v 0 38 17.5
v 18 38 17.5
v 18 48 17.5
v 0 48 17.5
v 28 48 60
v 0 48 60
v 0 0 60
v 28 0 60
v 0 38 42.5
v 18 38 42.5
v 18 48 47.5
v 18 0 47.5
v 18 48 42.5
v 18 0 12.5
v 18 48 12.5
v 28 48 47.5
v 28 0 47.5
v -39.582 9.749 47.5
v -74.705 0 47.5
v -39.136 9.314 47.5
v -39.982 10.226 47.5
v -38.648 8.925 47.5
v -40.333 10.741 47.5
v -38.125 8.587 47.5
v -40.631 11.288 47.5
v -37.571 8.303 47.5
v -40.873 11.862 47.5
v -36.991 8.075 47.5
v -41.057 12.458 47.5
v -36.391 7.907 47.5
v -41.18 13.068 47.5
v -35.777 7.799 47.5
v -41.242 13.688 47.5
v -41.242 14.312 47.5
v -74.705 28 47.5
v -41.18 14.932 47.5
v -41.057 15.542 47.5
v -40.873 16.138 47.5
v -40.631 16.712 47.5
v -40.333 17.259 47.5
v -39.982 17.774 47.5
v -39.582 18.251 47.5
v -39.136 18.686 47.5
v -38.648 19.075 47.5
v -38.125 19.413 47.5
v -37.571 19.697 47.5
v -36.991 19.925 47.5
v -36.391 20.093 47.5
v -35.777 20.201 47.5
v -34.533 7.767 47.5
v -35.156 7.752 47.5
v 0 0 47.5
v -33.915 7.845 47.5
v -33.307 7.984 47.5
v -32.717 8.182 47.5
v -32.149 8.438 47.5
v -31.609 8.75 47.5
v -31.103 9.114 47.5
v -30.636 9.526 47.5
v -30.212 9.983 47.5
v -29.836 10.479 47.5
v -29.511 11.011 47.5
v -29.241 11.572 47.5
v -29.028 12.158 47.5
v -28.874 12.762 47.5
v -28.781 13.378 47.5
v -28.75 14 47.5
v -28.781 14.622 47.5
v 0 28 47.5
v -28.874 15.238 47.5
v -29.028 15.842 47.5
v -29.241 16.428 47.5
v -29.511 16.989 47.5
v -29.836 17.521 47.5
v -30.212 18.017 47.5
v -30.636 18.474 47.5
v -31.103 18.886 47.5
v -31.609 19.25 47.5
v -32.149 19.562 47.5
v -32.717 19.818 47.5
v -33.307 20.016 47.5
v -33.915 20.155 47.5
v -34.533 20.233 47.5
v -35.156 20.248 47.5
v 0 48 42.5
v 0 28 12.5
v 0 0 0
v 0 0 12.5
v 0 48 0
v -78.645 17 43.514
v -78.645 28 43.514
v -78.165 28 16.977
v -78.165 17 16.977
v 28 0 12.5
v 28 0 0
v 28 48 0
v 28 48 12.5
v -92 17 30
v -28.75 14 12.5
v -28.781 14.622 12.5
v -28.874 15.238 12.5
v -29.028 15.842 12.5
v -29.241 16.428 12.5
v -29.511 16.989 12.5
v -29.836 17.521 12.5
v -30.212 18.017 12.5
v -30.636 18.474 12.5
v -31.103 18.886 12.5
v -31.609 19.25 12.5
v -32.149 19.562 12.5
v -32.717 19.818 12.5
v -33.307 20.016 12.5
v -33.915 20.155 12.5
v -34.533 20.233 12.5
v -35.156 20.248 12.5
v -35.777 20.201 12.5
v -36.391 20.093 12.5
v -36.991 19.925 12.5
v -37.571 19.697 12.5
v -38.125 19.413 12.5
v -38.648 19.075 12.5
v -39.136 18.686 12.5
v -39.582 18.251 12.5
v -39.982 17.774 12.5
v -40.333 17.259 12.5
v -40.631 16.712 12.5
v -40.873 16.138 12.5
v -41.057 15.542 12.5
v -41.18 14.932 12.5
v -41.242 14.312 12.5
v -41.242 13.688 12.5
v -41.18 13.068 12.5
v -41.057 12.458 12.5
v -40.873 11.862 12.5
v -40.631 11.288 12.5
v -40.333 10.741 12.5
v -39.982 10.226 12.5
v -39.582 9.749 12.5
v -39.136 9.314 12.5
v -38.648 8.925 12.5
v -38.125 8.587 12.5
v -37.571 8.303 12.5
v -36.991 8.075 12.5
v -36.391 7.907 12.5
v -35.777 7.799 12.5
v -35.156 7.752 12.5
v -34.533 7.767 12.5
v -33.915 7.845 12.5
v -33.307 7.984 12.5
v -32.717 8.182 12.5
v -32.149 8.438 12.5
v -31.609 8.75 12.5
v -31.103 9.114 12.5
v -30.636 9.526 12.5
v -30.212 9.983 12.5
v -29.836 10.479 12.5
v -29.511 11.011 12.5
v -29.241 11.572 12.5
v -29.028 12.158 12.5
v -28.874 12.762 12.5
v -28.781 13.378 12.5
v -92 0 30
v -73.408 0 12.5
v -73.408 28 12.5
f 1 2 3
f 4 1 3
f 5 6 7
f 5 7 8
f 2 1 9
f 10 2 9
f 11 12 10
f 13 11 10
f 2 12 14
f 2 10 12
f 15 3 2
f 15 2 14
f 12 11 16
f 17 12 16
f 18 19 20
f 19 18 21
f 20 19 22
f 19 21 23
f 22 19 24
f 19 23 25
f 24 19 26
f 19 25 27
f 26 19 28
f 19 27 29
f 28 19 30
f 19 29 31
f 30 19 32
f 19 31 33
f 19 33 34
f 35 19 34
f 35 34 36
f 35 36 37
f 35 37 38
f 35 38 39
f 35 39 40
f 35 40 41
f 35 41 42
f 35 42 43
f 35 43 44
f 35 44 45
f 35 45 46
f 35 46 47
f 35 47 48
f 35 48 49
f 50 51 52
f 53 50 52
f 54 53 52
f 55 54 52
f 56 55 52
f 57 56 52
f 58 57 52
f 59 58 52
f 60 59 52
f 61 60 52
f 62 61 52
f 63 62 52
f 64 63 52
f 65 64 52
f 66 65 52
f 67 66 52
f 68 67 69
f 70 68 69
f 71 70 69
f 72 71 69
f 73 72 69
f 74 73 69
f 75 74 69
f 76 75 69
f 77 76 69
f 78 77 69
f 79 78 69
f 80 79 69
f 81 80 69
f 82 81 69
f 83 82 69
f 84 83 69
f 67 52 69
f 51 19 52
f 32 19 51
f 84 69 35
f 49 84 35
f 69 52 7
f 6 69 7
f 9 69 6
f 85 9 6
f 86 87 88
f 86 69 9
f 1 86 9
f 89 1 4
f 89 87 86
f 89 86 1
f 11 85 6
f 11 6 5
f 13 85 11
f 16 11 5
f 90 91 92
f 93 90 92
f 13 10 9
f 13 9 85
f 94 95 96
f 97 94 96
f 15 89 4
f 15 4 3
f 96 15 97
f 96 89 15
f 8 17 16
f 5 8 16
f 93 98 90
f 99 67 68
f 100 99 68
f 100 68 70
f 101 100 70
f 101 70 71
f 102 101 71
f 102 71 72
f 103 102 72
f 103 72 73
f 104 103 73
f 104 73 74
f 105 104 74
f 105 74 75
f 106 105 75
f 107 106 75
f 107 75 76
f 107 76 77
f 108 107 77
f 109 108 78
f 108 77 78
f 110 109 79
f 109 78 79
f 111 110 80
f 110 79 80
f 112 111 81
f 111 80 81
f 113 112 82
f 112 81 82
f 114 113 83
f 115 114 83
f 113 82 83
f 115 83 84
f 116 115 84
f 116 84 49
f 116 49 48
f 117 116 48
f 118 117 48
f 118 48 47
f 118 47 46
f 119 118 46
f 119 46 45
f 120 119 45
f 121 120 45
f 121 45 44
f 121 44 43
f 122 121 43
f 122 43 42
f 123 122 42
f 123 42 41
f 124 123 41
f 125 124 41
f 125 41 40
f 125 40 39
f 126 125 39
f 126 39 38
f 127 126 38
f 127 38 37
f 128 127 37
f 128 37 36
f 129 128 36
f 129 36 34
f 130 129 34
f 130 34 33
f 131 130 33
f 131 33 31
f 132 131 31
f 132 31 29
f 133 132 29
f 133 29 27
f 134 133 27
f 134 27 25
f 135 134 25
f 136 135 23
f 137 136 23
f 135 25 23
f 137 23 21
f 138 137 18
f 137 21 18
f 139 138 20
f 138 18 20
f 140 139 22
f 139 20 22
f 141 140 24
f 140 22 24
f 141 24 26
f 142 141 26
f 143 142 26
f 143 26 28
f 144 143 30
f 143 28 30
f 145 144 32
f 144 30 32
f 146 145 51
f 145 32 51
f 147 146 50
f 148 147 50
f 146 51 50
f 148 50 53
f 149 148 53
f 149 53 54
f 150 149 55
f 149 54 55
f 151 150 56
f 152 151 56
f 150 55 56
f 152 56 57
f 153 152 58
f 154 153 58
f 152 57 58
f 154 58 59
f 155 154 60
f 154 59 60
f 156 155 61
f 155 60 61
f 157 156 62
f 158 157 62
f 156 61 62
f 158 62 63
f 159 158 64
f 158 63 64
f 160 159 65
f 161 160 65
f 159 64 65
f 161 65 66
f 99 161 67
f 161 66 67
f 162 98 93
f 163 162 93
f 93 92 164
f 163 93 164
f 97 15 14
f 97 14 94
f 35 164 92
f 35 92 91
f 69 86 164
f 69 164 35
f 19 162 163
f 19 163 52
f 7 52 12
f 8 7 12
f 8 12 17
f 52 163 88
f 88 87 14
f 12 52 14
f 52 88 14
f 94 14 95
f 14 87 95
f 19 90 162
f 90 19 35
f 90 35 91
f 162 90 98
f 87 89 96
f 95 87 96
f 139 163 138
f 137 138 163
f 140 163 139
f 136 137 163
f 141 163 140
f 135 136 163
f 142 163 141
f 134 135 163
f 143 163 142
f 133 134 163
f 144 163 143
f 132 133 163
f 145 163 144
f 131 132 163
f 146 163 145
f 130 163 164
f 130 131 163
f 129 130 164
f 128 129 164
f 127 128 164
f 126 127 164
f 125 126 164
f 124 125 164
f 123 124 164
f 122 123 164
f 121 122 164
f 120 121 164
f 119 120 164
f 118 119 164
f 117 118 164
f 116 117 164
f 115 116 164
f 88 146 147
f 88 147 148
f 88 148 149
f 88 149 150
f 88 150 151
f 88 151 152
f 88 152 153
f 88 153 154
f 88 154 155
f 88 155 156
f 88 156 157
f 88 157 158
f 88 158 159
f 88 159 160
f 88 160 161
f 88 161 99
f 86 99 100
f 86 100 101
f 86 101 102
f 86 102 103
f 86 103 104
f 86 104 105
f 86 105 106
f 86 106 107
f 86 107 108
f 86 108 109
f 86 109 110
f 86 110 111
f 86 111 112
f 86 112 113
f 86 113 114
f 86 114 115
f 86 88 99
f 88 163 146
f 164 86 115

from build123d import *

# Parameters (mm, degrees)
SKETCH1_W           = 28
SKETCH1_H           = 48
BOSS_EXTRUDE3_DEPTH = 60
SKETCH6_W           = 10
SKETCH6_H           = 35
CUT_EXTRUDE7_DEPTH  = 48
SKETCH7_W           = 25
SKETCH7_H           = 10
CUT_EXTRUDE8_DEPTH  = 48
SKETCH8_W           = 35
SKETCH8_H           = 28
BOSS_EXTRUDE4_DEPTH = 92
SKETCH9_R           = 6.25
CUT_EXTRUDE9_DEPTH  = 59
CUT_EXTRUDE12_DEPTH = 59
CUT_EXTRUDE13_DEPTH = 59
CUT_EXTRUDE18_DEPTH = 11


with BuildPart() as part:
    # Sketch1 → Boss-Extrude3 (new body)
    with BuildSketch(Plane.XY):
        with Locations((14, 24)):
            Rectangle(SKETCH1_W, SKETCH1_H)
    extrude(amount=BOSS_EXTRUDE3_DEPTH)

    # Sketch6 → Cut-Extrude7 (cut)
    with BuildSketch(Plane(origin=(0, 48, 0), x_dir=(1, 0, 0), z_dir=(0, 1, 0))):
        with Locations((23, -30)):
            Rectangle(SKETCH6_W, SKETCH6_H)
    extrude(amount=-CUT_EXTRUDE7_DEPTH, mode=Mode.SUBTRACT)

    # Sketch7 → Cut-Extrude8 (cut)
    with BuildSketch(Plane.ZY):
        with Locations((30, 43)):
            Rectangle(SKETCH7_W, SKETCH7_H)
    extrude(amount=-CUT_EXTRUDE8_DEPTH, mode=Mode.SUBTRACT)

    # Sketch8 → Boss-Extrude4 (add)
    with BuildSketch(Plane.ZY):
        with Locations((30, 14)):
            Rectangle(SKETCH8_W, SKETCH8_H)
    extrude(amount=BOSS_EXTRUDE4_DEPTH)

    # Sketch9 → Cut-Extrude9 (cut)
    with BuildSketch(Plane.XY.offset(47.5)):
        with Locations((-35, 14)):
            Circle(SKETCH9_R)
    extrude(amount=-CUT_EXTRUDE9_DEPTH, mode=Mode.SUBTRACT)

    # Sketch16 → Cut-Extrude12 (cut)
    with BuildSketch(Plane(origin=(0, 28, 0), x_dir=(1, 0, 0), z_dir=(0, 1, 0))):
        Polygon((-92, -30), (-73.408450704, -12.5), (-92, -12.5), align=None)
    extrude(amount=-CUT_EXTRUDE12_DEPTH, mode=Mode.SUBTRACT)

    # Sketch17 → Cut-Extrude13 (cut)
    with BuildSketch(Plane(origin=(0, 28, 0), x_dir=(1, 0, 0), z_dir=(0, 1, 0))):
        Polygon((-92, -30), (-92, -47.5), (-74.705382998, -47.5), align=None)
    extrude(amount=-CUT_EXTRUDE13_DEPTH, mode=Mode.SUBTRACT)

    # Sketch18 → Cut-Extrude18 (cut)
    with BuildSketch(Plane(origin=(0, 28, 0), x_dir=(1, 0, 0), z_dir=(0, 1, 0))):
        Polygon((-92, -30), (-78.644507081, -43.514096673), (-78.164969417, -16.977253409), align=None)
    extrude(amount=-CUT_EXTRUDE18_DEPTH, mode=Mode.SUBTRACT)


solid = part.part
